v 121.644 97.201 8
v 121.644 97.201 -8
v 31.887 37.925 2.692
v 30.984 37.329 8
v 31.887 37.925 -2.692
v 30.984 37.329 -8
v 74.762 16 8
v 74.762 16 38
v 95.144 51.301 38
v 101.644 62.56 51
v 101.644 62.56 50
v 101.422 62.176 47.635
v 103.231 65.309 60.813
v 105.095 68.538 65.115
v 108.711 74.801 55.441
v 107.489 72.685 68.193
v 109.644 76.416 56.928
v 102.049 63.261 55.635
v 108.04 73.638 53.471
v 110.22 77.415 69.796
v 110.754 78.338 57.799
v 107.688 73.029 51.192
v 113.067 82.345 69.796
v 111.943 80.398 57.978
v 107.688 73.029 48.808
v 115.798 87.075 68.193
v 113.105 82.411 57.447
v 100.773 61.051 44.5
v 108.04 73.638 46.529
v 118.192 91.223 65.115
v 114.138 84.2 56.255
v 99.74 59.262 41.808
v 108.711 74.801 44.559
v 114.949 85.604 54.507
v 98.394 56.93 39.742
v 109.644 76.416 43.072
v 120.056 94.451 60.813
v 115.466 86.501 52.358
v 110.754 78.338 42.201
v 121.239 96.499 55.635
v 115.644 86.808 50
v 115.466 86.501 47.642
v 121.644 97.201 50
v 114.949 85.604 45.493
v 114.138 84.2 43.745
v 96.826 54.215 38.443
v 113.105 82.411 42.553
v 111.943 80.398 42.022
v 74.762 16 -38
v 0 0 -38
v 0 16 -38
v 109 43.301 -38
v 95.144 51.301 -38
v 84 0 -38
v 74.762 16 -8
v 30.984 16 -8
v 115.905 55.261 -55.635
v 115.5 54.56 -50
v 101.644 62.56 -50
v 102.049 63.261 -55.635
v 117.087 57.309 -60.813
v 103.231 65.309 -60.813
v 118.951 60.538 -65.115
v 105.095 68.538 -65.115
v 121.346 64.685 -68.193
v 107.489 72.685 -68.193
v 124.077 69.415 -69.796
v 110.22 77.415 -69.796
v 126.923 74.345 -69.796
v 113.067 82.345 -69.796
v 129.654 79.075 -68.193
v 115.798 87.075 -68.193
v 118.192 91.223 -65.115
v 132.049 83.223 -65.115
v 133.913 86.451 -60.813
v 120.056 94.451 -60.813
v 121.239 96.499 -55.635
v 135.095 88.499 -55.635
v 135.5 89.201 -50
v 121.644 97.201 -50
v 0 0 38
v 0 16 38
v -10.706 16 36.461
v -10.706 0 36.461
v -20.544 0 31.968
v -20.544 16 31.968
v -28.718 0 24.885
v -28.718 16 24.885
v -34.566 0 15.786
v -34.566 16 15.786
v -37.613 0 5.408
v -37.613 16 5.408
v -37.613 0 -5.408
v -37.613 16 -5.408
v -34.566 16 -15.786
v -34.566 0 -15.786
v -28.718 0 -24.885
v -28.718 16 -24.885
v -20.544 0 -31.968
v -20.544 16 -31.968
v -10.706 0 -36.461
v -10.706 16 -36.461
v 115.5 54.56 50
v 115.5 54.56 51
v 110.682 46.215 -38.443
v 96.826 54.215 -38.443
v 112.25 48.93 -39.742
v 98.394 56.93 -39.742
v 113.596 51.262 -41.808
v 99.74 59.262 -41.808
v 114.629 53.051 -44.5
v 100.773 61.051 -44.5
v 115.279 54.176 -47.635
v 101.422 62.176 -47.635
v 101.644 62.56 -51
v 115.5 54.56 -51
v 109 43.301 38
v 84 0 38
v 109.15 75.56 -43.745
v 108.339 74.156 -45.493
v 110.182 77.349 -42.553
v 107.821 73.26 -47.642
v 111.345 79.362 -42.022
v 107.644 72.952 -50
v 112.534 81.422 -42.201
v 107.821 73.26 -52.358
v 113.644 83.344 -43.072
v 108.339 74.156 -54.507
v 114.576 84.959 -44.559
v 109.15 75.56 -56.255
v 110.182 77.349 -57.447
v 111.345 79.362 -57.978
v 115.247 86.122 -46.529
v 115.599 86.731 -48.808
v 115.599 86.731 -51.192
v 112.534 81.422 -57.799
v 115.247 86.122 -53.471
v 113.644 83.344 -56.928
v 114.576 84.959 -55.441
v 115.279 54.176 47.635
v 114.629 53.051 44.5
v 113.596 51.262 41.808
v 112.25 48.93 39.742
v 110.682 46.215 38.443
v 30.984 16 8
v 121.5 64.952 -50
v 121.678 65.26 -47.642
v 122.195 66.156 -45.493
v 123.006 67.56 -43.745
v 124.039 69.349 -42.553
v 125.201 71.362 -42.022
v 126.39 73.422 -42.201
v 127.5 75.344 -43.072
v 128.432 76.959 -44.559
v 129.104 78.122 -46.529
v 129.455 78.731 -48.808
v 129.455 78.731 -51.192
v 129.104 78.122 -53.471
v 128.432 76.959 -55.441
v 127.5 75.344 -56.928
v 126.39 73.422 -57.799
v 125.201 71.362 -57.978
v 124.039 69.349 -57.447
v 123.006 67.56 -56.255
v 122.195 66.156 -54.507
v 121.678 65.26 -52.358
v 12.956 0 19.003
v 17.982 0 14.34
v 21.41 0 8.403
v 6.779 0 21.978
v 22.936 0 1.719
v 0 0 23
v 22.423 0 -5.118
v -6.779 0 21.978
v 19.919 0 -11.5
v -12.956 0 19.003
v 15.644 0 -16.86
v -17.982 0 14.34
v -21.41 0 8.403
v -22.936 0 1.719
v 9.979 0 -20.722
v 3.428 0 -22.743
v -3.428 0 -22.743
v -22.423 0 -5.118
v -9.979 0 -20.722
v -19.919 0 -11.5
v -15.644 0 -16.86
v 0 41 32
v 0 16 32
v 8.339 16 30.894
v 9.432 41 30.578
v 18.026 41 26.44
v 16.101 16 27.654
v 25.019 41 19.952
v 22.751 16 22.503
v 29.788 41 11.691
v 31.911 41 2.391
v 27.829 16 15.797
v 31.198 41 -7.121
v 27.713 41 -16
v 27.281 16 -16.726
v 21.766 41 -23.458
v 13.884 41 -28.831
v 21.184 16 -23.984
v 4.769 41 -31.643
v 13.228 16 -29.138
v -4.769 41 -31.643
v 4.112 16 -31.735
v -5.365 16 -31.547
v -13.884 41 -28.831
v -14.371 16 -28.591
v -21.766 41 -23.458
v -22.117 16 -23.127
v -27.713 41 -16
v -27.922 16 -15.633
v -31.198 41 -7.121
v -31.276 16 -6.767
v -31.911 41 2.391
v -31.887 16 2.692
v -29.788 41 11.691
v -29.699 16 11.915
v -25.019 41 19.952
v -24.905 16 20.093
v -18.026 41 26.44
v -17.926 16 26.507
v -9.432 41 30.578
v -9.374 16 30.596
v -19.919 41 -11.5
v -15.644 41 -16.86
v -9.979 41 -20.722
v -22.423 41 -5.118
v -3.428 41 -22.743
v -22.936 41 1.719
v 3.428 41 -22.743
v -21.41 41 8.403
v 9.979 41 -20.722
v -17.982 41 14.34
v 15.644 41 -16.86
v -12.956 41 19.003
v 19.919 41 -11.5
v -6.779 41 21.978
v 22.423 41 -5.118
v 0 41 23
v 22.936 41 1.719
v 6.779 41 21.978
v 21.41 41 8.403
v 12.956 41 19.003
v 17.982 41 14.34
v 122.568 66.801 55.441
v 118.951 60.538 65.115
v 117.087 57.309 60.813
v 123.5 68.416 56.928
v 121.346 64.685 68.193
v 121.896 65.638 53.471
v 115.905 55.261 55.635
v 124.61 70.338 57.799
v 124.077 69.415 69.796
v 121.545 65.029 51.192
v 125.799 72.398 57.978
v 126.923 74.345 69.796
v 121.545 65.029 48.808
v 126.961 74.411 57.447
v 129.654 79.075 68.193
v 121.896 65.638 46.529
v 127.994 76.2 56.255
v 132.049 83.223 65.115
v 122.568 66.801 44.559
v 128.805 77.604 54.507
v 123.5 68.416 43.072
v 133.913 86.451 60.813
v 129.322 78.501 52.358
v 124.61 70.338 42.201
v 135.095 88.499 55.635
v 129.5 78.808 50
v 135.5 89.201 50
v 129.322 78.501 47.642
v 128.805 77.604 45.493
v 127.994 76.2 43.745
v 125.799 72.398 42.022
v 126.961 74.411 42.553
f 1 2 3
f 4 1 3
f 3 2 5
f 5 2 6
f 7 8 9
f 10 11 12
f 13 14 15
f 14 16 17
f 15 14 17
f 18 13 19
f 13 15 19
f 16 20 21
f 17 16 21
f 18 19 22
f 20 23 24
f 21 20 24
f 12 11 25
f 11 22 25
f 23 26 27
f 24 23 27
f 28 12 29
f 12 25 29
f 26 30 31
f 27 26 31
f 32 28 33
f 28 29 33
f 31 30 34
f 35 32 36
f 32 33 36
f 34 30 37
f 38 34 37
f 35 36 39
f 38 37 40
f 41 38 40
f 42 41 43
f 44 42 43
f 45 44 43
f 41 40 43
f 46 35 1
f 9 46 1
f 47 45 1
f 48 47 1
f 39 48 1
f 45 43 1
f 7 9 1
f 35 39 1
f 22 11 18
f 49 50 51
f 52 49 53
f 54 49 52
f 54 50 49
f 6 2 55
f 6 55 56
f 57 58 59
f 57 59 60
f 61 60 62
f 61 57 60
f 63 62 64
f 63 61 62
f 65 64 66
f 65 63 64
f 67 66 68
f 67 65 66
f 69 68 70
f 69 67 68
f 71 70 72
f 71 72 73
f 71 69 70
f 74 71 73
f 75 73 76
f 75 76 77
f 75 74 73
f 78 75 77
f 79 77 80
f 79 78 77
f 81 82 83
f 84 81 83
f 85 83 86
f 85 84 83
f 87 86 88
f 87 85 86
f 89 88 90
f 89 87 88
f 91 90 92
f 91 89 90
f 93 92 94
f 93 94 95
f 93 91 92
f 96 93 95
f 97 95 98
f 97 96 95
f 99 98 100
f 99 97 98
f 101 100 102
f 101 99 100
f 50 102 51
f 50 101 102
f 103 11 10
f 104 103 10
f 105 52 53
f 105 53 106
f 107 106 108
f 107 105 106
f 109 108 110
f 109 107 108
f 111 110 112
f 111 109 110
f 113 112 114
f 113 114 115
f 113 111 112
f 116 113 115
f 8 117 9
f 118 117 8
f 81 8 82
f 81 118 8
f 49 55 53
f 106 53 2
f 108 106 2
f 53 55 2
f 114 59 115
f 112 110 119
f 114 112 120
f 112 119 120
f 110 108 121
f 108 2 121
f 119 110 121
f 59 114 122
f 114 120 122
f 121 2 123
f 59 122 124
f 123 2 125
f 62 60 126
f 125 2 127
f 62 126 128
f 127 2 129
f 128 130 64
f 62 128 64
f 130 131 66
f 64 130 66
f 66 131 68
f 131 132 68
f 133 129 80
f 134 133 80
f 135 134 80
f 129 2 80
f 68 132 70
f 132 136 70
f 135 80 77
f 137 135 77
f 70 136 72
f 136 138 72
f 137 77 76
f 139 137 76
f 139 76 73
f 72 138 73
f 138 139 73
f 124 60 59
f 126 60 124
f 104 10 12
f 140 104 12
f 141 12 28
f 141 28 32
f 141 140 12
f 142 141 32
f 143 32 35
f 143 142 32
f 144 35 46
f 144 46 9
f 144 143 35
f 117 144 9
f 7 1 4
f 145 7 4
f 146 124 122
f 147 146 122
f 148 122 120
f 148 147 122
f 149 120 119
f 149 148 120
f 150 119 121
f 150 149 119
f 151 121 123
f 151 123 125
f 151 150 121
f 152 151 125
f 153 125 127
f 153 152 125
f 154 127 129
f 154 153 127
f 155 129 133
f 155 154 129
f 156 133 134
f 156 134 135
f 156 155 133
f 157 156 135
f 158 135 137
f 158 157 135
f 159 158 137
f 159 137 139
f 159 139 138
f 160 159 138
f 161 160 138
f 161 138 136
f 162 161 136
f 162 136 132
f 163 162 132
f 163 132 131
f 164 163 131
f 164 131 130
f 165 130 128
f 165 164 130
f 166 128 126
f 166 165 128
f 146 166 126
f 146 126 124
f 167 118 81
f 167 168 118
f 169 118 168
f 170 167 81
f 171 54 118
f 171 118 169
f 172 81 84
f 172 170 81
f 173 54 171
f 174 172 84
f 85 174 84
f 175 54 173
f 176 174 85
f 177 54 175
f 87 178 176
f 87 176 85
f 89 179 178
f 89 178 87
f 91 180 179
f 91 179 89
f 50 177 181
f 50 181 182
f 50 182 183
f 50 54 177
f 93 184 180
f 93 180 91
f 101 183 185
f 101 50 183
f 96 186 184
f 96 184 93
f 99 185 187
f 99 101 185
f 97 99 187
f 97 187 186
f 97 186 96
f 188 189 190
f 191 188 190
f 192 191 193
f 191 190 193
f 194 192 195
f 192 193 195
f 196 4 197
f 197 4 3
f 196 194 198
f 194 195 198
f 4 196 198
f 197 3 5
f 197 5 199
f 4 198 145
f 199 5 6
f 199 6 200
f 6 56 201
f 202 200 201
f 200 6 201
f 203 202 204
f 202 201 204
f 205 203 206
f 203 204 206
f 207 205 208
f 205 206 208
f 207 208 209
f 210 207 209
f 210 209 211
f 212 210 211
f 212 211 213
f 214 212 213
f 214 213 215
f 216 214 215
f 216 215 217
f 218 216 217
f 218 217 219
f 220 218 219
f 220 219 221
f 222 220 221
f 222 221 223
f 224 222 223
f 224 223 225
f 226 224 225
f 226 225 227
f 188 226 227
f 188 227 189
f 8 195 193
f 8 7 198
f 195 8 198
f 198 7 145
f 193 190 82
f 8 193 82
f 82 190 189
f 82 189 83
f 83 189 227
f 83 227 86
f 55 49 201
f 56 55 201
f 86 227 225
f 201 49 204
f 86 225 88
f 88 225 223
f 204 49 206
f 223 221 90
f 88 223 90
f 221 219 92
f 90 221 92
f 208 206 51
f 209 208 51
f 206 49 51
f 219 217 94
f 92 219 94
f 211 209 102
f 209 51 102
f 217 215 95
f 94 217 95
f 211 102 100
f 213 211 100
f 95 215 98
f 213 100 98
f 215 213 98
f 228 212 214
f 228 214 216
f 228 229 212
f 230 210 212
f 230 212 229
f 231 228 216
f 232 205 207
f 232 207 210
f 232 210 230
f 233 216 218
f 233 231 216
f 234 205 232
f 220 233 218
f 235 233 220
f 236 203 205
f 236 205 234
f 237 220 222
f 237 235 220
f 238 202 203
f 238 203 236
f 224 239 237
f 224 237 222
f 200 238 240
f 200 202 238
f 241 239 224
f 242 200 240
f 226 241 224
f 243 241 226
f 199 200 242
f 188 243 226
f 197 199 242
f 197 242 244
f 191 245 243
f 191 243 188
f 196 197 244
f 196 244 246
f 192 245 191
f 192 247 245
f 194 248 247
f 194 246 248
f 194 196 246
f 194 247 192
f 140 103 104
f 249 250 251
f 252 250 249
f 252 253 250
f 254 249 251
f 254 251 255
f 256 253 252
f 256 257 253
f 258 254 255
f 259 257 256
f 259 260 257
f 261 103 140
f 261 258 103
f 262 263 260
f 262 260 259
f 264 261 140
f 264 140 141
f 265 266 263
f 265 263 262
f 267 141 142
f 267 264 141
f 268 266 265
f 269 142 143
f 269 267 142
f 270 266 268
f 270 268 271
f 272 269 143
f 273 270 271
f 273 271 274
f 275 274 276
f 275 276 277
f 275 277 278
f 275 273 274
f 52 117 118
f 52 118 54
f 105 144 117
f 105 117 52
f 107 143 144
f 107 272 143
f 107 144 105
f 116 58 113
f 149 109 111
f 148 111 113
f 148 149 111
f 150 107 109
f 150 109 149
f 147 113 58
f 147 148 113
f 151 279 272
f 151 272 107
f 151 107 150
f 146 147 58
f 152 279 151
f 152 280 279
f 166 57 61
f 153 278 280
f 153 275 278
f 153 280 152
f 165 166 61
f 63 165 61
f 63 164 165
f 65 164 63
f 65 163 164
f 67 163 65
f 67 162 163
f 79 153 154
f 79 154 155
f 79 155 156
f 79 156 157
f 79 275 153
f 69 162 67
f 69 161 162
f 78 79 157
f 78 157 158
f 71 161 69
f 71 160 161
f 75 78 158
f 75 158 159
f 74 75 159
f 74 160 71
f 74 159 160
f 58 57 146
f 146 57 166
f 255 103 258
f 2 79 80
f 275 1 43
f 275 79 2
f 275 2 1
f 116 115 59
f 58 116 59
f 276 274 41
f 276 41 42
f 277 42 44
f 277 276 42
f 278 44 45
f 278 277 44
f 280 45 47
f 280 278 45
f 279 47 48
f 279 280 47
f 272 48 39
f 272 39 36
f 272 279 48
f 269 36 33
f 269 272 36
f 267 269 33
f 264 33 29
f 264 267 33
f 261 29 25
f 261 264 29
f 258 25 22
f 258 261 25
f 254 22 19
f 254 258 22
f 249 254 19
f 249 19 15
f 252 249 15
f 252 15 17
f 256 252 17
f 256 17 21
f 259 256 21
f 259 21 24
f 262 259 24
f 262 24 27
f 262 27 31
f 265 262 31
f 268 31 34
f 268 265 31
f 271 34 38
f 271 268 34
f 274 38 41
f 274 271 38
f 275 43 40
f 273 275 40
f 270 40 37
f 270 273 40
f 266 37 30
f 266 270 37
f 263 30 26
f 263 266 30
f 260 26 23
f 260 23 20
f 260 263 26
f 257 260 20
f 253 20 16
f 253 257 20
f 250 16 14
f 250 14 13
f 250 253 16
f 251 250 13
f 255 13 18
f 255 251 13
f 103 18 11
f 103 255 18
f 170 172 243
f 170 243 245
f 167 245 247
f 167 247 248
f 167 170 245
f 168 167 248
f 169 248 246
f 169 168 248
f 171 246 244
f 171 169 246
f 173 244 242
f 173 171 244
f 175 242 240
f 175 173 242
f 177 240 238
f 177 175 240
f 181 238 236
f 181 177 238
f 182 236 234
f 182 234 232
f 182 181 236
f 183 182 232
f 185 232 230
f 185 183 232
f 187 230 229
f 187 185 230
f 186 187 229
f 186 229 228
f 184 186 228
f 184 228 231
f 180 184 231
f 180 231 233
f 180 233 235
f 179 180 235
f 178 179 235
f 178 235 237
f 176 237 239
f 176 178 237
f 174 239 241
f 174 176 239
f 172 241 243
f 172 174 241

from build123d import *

# Parameters (mm, degrees)
SKETCH_1_R      = 32
EXTRUDE_1_DEPTH = 16
SKETCH_1_3_R    = 32
SKETCH_1_3_R_2  = 23
EXTRUDE_2_DEPTH = 41
SKETCH_3_R      = 8
EXTRUDE_3_DEPTH = 16
RIB_1_REACH     = 182.854
SKETCH_4_WALL_W = 471.13581316
SKETCH_4_WALL_H = 16


with BuildPart() as part:
    # 草图1 → 凸台-拉伸1 (new body)
    with BuildSketch(Plane(origin=(0, 0, 0), x_dir=(1, 0, 0), z_dir=(0, 1, 0))):
        with BuildLine():
            Line((84, 38), (0, 38))
            ThreePointArc((0, 38), (-38, 0), (0, -38))
            Line((0, -38), (84, -38))
            Line((84, -38), (84, 38))
        make_face()
        Circle(SKETCH_1_R, mode=Mode.SUBTRACT)
    extrude(amount=EXTRUDE_1_DEPTH)

    # 草图1<3> → 凸台-拉伸2 (add)
    with BuildSketch(Plane(origin=(0, 0, 0), x_dir=(1, 0, 0), z_dir=(0, 1, 0))):
        Circle(SKETCH_1_3_R)
        Circle(SKETCH_1_3_R_2, mode=Mode.SUBTRACT)
    extrude(amount=EXTRUDE_2_DEPTH)

    # 草图3 → 凸台-拉伸3 (add)
    with BuildSketch(Plane(origin=(63, -36.373066959, 0), x_dir=(0, 0, 1), z_dir=(-0.8660254037844398, 0.499999999999998, 0))):
        with BuildLine():
            Line((-38, 42), (-38, 92))
            ThreePointArc((-38, 92), (-41.807611845, 101.192388155), (-51, 105))
            Line((-51, 105), (-50, 105))
            ThreePointArc((-50, 105), (-70, 125), (-50, 145))
            Line((-50, 145), (50, 145))
            ThreePointArc((50, 145), (70, 125), (50, 105))
            Line((50, 105), (51, 105))
            ThreePointArc((51, 105), (41.807611845, 101.192388155), (38, 92))
            Line((38, 92), (38, 42))
            Line((38, 42), (-38, 42))
        make_face()
        with Locations((-50, 125)):
            Circle(SKETCH_3_R, mode=Mode.SUBTRACT)
        with Locations((50, 125)):
            Circle(SKETCH_3_R, mode=Mode.SUBTRACT)
    extrude(amount=EXTRUDE_3_DEPTH)

    # 草图4 wall → 筋1 (add, up to next)
    with BuildSketch(Plane(origin=(76.821796769, 67.600308295, 0), x_dir=(-0.834455975571, -0.551074609136, 0), z_dir=(0.551074609136, -0.834455975571, 0)), mode=Mode.PRIVATE) as rib_1_sk1:
        Rectangle(SKETCH_4_WALL_W, SKETCH_4_WALL_H)
    rib_1_tool1 = extrude(rib_1_sk1.sketch, amount=RIB_1_REACH, mode=Mode.PRIVATE) - part.part
    add(rib_1_tool1.solids().sort_by_distance((76.821796769, 67.600308295, 0))[0])


solid = part.part
